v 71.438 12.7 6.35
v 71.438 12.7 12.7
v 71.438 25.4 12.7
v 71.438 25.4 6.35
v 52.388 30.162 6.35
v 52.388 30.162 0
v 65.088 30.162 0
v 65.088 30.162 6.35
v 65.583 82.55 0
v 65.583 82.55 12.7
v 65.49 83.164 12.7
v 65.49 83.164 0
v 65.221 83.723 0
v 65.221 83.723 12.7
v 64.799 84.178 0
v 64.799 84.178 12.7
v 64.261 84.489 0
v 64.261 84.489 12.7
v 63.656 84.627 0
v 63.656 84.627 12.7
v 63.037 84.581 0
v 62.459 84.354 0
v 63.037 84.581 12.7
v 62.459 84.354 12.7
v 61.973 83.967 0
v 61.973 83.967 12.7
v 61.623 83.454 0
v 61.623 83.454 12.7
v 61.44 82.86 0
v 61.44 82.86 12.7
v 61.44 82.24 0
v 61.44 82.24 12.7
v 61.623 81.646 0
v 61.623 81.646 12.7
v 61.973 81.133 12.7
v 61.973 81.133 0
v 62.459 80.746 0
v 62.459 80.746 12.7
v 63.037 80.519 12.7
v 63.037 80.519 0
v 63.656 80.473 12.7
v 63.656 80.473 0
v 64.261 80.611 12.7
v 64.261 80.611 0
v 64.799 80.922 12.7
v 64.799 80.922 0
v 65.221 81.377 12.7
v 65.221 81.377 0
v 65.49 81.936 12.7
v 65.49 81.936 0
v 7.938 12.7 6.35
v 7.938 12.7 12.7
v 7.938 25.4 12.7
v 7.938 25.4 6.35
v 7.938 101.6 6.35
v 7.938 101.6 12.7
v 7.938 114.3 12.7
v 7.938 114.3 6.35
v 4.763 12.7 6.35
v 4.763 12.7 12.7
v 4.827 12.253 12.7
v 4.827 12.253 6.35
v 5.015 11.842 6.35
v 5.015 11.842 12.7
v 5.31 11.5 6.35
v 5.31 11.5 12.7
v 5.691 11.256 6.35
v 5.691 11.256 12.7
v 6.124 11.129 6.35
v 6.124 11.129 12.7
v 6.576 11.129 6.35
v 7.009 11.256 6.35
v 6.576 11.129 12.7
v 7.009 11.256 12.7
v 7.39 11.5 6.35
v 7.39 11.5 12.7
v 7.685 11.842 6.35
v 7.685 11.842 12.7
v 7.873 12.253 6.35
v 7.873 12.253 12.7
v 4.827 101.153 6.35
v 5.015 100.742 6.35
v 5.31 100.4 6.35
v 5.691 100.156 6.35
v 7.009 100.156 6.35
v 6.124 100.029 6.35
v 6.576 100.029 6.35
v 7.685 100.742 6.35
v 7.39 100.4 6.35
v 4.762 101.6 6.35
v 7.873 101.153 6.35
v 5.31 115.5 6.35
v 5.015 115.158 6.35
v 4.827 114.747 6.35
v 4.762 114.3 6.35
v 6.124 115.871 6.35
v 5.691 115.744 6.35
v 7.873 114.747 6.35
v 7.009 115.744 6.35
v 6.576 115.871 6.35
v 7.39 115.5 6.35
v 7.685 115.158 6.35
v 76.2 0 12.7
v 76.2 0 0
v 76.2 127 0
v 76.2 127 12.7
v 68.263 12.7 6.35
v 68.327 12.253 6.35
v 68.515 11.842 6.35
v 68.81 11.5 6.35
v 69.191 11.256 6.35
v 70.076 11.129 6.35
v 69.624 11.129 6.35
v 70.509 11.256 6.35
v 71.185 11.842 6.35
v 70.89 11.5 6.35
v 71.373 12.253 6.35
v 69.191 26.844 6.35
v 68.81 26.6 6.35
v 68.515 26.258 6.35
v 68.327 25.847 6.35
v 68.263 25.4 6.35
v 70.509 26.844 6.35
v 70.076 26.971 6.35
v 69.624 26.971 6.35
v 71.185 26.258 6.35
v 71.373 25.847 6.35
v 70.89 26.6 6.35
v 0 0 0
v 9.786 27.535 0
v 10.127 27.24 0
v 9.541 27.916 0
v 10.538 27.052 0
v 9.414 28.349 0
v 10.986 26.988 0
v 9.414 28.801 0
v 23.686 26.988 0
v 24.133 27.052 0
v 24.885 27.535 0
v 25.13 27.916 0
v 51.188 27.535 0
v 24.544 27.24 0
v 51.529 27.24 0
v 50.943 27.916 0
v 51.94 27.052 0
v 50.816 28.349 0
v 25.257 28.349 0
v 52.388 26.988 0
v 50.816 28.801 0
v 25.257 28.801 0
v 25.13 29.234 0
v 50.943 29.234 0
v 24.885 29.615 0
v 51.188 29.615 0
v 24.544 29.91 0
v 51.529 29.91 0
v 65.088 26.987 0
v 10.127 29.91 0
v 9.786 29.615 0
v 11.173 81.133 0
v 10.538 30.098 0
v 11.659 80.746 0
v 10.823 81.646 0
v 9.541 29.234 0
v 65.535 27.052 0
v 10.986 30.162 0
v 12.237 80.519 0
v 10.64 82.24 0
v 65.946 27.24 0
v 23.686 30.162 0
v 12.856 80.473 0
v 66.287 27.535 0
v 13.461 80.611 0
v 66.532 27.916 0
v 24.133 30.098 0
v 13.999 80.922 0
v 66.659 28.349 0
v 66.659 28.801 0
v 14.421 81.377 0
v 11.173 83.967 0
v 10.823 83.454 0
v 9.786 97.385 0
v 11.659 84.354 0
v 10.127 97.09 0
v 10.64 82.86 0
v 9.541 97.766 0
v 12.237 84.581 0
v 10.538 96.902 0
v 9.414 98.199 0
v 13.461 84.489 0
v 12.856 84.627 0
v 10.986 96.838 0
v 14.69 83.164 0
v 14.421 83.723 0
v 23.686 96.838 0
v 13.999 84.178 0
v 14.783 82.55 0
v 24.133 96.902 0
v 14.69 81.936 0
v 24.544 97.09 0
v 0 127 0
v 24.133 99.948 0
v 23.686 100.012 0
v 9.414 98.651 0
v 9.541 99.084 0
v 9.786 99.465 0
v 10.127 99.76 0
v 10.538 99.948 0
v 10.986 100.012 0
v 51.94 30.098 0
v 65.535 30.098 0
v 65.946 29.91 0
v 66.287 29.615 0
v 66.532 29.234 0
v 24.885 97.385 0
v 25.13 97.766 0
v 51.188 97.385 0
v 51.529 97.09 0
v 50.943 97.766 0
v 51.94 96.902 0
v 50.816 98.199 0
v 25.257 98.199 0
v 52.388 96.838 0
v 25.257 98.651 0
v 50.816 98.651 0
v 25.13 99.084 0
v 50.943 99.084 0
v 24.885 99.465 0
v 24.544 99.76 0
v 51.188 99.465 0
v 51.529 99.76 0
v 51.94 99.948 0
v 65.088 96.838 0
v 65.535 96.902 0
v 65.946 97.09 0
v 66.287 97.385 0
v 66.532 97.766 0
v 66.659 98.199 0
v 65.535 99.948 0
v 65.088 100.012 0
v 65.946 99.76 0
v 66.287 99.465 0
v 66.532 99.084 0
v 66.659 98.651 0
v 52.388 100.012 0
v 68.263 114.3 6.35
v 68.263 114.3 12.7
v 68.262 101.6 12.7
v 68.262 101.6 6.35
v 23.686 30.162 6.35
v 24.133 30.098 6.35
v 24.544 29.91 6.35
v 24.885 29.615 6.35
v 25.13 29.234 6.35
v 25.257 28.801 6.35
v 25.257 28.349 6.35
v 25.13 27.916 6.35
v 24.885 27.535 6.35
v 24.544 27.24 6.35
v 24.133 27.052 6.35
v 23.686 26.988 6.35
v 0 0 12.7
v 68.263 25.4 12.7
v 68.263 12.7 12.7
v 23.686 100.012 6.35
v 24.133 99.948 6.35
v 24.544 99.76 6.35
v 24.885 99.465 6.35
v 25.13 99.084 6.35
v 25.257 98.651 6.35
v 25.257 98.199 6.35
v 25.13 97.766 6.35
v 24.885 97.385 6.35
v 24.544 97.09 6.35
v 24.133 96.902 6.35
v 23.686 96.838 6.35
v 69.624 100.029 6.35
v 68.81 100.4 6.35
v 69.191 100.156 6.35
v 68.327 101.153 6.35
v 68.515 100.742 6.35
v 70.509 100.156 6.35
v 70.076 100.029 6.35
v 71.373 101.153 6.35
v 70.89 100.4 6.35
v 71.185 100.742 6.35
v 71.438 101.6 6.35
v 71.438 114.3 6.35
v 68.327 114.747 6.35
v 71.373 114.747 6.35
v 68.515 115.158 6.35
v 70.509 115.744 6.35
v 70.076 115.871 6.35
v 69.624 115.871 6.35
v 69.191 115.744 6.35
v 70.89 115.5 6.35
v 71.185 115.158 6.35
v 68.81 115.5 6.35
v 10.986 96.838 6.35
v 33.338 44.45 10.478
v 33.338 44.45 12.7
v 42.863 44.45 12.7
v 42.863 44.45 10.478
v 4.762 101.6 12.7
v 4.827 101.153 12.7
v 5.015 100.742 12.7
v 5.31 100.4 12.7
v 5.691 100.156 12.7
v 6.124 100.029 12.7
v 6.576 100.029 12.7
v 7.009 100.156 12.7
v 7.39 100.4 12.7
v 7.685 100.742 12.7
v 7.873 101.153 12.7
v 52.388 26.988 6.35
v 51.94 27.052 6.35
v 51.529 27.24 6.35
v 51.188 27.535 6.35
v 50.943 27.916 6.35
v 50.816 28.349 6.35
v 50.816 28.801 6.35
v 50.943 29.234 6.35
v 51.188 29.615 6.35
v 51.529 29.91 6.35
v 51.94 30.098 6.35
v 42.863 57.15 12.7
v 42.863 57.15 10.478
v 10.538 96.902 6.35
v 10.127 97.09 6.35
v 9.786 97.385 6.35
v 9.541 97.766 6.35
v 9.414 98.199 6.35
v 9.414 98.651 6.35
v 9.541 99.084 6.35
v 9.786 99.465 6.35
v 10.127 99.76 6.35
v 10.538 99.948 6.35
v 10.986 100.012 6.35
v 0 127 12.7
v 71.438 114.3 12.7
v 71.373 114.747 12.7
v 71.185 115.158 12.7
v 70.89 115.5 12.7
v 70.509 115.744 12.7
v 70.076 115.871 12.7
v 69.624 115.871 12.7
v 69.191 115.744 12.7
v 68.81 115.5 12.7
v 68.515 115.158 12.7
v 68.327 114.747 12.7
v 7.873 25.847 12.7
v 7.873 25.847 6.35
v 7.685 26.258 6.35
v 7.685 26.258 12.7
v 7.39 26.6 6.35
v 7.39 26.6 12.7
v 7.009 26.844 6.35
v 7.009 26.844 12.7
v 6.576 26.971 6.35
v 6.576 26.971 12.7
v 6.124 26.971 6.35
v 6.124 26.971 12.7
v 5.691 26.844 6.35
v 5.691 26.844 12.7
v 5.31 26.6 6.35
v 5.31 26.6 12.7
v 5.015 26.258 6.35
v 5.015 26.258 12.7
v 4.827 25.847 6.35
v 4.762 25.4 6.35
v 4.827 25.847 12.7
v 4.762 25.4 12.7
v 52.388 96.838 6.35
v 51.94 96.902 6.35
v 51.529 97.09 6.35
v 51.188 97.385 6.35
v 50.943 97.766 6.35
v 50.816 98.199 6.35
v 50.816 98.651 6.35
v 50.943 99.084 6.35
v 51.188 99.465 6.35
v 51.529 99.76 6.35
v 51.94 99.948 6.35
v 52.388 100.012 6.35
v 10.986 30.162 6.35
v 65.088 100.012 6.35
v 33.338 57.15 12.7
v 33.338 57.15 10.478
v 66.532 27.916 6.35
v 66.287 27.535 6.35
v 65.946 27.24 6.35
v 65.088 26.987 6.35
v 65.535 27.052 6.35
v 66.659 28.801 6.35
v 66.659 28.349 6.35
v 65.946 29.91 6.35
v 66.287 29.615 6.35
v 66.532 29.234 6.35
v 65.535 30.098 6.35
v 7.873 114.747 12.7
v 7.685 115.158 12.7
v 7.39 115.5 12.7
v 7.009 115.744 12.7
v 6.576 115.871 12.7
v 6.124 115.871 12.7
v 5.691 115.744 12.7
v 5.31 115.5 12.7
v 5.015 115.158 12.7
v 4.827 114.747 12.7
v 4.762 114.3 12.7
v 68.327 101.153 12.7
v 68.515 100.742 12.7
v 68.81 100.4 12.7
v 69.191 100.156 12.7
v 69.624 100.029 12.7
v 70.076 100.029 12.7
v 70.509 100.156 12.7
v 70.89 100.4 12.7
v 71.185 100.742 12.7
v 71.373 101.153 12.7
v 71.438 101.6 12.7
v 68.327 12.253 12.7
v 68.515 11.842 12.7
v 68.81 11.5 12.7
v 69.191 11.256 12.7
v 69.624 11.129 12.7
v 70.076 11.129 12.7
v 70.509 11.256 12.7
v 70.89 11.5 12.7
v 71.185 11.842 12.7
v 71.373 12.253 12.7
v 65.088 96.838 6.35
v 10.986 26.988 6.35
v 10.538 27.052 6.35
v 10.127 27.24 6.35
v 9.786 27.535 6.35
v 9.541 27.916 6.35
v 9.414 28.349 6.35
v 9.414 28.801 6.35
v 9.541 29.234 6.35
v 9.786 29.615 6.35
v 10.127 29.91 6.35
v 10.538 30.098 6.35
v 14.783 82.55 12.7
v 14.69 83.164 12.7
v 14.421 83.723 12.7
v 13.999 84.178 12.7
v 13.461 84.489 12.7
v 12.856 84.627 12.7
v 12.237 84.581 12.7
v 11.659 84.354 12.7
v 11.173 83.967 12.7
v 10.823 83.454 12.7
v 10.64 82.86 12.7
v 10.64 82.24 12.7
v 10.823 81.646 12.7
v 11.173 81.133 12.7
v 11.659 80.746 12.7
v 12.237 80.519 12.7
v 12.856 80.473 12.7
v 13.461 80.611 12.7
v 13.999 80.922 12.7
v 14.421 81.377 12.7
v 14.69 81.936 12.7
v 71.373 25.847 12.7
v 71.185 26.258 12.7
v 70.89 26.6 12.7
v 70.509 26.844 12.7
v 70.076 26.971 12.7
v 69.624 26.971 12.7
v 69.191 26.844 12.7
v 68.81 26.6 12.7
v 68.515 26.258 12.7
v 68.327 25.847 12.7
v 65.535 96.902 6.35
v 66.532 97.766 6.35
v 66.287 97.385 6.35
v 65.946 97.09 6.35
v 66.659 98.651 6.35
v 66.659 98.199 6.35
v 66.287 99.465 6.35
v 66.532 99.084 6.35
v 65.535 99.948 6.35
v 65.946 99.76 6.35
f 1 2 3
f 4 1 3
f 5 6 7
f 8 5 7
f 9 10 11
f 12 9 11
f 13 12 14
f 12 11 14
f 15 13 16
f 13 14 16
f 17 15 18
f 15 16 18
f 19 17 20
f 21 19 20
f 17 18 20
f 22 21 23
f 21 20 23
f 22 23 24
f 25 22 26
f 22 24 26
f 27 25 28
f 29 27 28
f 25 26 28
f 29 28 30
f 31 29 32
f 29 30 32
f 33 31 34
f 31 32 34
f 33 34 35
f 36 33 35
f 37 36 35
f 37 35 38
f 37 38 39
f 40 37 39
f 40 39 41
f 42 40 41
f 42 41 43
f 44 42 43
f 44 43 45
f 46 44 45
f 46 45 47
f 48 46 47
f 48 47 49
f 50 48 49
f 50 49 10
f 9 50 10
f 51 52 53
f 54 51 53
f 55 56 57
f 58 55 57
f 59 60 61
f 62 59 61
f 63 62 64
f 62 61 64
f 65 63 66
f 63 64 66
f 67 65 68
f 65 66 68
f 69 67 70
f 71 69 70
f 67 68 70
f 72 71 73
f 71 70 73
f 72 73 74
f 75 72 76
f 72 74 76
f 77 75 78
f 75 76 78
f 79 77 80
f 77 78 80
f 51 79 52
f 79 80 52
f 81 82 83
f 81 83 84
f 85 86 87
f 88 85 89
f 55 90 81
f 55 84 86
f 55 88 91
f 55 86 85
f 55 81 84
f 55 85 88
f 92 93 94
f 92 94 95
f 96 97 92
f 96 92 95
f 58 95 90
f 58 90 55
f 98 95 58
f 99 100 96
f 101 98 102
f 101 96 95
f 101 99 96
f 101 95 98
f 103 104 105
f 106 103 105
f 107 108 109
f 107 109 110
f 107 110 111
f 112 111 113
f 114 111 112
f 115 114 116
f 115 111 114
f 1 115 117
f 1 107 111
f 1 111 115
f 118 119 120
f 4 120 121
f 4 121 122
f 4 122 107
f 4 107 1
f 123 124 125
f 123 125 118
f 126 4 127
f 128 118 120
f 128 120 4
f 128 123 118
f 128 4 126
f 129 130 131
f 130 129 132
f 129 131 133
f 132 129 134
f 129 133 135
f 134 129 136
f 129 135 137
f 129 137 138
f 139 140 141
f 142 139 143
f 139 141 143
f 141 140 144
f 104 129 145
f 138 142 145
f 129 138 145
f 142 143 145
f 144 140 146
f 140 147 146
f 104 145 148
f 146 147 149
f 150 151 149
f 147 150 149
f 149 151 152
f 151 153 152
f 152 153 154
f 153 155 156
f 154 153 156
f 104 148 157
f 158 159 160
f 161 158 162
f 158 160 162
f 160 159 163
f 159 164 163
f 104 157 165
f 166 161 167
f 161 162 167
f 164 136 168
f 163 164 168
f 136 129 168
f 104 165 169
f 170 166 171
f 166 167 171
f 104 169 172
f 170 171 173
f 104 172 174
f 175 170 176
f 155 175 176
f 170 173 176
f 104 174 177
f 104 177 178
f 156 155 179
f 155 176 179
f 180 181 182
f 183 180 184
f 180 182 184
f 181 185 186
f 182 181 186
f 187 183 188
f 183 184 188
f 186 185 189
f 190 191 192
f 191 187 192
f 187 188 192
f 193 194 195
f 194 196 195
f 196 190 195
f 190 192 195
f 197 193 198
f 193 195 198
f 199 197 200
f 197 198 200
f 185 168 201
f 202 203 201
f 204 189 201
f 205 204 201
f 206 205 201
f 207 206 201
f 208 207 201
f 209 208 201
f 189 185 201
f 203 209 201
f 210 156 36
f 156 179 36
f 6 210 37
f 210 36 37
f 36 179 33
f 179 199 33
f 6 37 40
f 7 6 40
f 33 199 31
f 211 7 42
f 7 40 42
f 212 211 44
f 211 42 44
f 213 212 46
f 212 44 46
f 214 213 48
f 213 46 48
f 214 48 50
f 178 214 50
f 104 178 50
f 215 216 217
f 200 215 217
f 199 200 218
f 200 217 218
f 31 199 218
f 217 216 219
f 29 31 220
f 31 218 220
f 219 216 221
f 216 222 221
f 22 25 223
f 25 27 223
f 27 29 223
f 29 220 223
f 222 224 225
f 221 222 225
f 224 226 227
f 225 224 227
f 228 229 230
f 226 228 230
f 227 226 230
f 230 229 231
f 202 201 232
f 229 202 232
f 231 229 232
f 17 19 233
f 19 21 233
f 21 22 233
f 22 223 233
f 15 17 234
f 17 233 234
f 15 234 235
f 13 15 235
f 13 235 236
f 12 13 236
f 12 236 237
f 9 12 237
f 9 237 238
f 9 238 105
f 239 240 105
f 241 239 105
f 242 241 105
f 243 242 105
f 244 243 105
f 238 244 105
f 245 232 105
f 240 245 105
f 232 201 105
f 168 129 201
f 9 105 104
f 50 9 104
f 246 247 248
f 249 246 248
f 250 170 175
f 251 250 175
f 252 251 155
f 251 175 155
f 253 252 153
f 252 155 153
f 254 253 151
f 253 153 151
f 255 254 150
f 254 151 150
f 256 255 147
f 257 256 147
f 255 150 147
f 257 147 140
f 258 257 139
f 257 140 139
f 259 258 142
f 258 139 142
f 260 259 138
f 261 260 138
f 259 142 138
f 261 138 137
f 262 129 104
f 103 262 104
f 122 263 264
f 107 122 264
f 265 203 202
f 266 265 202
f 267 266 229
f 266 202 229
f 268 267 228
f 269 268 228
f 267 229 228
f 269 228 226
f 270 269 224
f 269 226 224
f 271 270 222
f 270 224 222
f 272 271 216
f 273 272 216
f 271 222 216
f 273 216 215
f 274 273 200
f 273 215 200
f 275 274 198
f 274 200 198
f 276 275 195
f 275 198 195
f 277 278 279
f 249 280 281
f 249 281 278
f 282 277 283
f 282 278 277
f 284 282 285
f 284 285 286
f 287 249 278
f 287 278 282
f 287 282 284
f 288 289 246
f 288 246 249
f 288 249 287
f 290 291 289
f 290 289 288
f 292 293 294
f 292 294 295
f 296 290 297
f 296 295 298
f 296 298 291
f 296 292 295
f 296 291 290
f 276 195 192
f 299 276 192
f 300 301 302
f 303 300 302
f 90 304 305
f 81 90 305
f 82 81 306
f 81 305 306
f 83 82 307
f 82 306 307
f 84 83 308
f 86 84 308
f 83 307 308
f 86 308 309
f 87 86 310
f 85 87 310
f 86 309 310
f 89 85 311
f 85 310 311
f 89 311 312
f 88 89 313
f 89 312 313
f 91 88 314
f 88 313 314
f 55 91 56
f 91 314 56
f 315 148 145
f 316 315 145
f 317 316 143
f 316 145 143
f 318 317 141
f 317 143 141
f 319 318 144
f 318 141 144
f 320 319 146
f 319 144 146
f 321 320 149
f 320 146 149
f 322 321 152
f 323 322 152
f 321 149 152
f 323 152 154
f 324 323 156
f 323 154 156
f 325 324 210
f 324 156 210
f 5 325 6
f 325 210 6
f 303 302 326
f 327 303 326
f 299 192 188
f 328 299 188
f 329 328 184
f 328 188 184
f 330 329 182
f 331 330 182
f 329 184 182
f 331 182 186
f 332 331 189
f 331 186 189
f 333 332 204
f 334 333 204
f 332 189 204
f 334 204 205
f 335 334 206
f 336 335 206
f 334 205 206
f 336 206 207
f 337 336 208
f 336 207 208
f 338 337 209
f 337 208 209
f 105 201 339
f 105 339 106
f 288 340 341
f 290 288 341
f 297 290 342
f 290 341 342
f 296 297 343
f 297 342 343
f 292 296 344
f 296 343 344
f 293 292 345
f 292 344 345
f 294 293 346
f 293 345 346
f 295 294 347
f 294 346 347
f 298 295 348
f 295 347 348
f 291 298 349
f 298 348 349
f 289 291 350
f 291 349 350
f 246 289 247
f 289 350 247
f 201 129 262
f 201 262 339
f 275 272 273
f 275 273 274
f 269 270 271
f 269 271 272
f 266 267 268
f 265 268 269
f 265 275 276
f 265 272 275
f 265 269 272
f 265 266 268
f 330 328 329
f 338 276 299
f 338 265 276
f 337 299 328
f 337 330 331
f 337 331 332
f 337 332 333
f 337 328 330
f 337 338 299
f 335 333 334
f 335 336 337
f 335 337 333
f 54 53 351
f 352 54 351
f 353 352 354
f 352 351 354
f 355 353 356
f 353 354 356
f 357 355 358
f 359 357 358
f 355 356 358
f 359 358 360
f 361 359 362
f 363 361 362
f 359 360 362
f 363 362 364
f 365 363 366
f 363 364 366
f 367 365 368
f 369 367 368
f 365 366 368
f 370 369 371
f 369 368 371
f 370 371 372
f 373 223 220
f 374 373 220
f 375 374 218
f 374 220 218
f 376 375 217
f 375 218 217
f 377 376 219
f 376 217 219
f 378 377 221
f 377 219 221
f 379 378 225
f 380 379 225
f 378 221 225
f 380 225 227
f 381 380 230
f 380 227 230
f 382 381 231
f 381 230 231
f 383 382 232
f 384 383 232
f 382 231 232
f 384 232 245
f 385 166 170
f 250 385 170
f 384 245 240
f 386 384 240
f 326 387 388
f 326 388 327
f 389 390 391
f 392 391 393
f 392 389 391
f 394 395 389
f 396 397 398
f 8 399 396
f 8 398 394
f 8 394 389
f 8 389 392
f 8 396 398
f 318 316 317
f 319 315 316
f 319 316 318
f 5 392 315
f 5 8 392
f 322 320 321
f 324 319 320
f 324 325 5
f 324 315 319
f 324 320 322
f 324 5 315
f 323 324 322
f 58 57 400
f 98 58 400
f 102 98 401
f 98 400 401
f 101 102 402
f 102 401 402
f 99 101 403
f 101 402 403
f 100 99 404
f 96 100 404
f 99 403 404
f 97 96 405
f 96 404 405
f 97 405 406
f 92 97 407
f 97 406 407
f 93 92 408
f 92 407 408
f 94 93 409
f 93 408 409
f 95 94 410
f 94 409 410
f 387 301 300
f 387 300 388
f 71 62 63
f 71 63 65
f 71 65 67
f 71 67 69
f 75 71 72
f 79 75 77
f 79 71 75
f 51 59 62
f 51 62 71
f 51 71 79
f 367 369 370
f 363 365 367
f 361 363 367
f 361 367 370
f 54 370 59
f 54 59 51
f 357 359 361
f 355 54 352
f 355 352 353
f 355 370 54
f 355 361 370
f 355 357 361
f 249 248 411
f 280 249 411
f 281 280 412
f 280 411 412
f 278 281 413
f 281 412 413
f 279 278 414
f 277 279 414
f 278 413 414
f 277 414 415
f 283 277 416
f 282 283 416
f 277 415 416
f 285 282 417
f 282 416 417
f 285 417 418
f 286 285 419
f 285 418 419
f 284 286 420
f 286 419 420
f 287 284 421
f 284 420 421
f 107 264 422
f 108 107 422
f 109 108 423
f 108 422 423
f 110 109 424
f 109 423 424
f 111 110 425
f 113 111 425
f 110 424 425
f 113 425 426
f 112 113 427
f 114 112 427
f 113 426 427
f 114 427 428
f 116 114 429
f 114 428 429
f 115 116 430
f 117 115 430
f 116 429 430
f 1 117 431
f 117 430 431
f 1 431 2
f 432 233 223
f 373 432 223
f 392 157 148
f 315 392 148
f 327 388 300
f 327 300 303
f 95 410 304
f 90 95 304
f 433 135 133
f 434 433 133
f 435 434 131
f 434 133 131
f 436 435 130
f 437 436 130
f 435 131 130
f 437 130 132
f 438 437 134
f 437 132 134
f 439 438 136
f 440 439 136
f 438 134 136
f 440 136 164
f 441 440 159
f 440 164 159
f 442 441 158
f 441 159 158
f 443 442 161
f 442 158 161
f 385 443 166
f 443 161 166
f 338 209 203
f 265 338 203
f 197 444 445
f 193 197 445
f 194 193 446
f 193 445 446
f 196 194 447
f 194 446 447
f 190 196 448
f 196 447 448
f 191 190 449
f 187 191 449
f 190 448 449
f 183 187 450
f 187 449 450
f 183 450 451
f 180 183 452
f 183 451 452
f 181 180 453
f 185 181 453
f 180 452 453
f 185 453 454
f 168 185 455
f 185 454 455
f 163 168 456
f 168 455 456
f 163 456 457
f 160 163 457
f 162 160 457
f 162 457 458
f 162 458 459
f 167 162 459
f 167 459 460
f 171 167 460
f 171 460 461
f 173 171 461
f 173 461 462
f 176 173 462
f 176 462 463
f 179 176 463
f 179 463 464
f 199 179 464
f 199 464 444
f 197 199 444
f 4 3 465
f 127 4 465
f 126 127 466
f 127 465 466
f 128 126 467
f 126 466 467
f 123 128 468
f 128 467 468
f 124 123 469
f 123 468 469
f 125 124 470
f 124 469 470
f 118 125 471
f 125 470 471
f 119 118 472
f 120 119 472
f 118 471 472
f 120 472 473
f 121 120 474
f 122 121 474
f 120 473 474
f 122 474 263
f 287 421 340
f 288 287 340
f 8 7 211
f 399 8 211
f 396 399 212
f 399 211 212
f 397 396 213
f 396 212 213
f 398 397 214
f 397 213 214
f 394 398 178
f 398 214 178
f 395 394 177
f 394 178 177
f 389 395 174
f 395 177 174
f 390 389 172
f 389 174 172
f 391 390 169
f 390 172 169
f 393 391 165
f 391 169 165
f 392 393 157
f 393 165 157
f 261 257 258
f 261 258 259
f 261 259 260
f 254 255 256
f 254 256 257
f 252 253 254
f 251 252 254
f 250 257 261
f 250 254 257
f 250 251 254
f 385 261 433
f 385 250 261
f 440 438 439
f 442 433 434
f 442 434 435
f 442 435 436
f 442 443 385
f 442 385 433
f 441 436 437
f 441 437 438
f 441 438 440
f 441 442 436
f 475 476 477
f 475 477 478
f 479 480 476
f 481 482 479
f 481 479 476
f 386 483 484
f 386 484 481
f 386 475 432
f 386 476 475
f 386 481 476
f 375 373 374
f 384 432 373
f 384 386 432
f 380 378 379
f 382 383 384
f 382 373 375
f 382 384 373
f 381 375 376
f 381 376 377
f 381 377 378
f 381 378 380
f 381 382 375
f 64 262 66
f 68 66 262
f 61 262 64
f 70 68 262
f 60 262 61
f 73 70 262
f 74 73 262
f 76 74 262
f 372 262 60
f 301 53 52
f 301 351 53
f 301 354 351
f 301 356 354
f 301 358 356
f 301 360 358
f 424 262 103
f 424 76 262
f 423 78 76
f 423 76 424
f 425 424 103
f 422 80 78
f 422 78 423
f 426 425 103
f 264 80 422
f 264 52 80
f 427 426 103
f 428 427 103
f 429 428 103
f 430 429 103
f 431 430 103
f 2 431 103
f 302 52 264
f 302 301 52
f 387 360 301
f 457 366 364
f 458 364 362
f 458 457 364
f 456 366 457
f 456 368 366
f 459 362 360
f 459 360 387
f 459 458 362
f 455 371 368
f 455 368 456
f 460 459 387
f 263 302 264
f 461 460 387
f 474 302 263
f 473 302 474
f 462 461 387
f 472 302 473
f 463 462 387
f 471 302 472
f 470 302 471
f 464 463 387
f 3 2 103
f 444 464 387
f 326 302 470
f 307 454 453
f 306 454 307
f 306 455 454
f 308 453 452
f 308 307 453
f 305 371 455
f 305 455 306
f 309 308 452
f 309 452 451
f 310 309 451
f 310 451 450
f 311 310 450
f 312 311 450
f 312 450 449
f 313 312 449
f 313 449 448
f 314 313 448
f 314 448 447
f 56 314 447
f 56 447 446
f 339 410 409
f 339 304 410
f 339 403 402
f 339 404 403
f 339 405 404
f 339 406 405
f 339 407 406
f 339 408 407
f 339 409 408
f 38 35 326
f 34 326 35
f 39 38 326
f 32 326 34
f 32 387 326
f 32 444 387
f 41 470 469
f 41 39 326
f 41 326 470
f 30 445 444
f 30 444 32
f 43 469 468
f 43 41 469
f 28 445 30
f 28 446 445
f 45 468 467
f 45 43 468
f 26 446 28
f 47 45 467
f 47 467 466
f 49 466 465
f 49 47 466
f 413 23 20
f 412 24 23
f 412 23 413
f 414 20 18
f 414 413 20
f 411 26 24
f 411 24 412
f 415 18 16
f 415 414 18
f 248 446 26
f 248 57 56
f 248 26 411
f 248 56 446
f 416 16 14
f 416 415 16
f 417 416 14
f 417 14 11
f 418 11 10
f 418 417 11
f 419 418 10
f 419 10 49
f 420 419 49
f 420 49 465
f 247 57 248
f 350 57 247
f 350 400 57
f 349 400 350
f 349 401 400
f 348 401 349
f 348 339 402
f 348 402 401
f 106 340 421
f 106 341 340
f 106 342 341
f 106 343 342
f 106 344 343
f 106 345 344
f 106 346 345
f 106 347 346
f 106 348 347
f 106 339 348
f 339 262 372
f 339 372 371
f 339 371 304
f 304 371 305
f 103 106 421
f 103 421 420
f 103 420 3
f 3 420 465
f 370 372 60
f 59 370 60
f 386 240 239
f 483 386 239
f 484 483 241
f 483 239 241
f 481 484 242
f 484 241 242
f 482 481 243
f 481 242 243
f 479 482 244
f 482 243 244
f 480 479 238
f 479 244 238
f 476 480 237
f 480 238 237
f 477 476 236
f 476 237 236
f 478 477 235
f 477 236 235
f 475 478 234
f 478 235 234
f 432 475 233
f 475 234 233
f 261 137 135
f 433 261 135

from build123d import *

# Parameters (mm, degrees)
SKETCH1_W           = 76.2
SKETCH1_H           = 127
BOSS_EXTRUDE1_DEPTH = 12.7
CUT_EXTRUDE1_DEPTH  = 6.35
CUT_EXTRUDE2_DEPTH  = 6.35
SKETCH4_W           = 9.525
SKETCH4_H           = 12.7
CUT_EXTRUDE3_DEPTH  = 2.2225
SKETCH5_R           = 2.0828
CUT_EXTRUDE4_DEPTH  = 25.4


with BuildPart() as part:
    # Sketch1 → Boss-Extrude1 (new body)
    with BuildSketch(Plane.XY):
        with Locations((38.1, 63.5)):
            Rectangle(SKETCH1_W, SKETCH1_H)
    extrude(amount=BOSS_EXTRUDE1_DEPTH)

    # Sketch2 → Cut-Extrude1 (cut)
    with BuildSketch(Plane.XY.offset(12.7)):
        with BuildLine():
            Line((71.4375, 12.7), (71.4375, 25.4))
            ThreePointArc((71.4375, 25.4), (69.85, 26.9875), (68.2625, 25.4))
            Line((68.2625, 25.4), (68.2625, 12.7))
            ThreePointArc((68.2625, 12.7), (69.85, 11.1125), (71.4375, 12.7))
        make_face()
        with BuildLine():
            Line((7.9375, 12.7), (7.9375, 25.4))
            ThreePointArc((7.9375, 25.4), (6.35, 26.9875), (4.7625, 25.4))
            Line((4.7625, 25.4), (4.7625, 12.7))
            ThreePointArc((4.7625, 12.7), (6.35, 11.1125), (7.9375, 12.7))
        make_face()
        with BuildLine():
            Line((7.9375, 101.6), (7.9375, 114.3))
            ThreePointArc((7.9375, 114.3), (6.35, 115.8875), (4.7625, 114.3))
            Line((4.7625, 114.3), (4.7625, 101.6))
            ThreePointArc((4.7625, 101.6), (6.35, 100.0125), (7.9375, 101.6))
        make_face()
        with BuildLine():
            Line((71.4375, 101.6), (71.4375, 114.3))
            ThreePointArc((71.4375, 114.3), (69.85, 115.8875), (68.2625, 114.3))
            Line((68.2625, 114.3), (68.2625, 101.6))
            ThreePointArc((68.2625, 101.6), (69.85, 100.0125), (71.4375, 101.6))
        make_face()
    extrude(amount=-CUT_EXTRUDE1_DEPTH, mode=Mode.SUBTRACT)

    # Sketch3 → Cut-Extrude2 (cut)
    with BuildSketch(Plane(origin=(0, 0, 0), x_dir=(-1, 0, 0), z_dir=(0, 0, -1))):
        with BuildLine():
            Line((-23.6855, 96.8375), (-10.9855, 96.8375))
            ThreePointArc((-10.9855, 96.8375), (-9.398, 98.425), (-10.9855, 100.0125))
            Line((-10.9855, 100.0125), (-23.6855, 100.0125))
            ThreePointArc((-23.6855, 100.0125), (-25.273, 98.425), (-23.6855, 96.8375))
        make_face()
        with BuildLine():
            Line((-65.0875, 96.8375), (-52.3875, 96.8375))
            ThreePointArc((-52.3875, 96.8375), (-50.8, 98.425), (-52.3875, 100.0125))
            Line((-52.3875, 100.0125), (-65.0875, 100.0125))
            ThreePointArc((-65.0875, 100.0125), (-66.675, 98.425), (-65.0875, 96.8375))
        make_face()
        with BuildLine():
            Line((-65.0875, 26.9875), (-52.3875, 26.9875))
            ThreePointArc((-52.3875, 26.9875), (-50.8, 28.575), (-52.3875, 30.1625))
            Line((-52.3875, 30.1625), (-65.0875, 30.1625))
            ThreePointArc((-65.0875, 30.1625), (-66.675, 28.575), (-65.0875, 26.9875))
        make_face()
        with BuildLine():
            Line((-23.6855, 26.9875), (-10.9855, 26.9875))
            ThreePointArc((-10.9855, 26.9875), (-9.398, 28.575), (-10.9855, 30.1625))
            Line((-10.9855, 30.1625), (-23.6855, 30.1625))
            ThreePointArc((-23.6855, 30.1625), (-25.273, 28.575), (-23.6855, 26.9875))
        make_face()
    extrude(amount=-CUT_EXTRUDE2_DEPTH, mode=Mode.SUBTRACT)

    # Sketch4 → Cut-Extrude3 (cut)
    with BuildSketch(Plane.XY.offset(12.7)):
        with Locations((38.1, 50.8)):
            Rectangle(SKETCH4_W, SKETCH4_H)
    extrude(amount=-CUT_EXTRUDE3_DEPTH, mode=Mode.SUBTRACT)

    # Sketch5 → Cut-Extrude4 (cut)
    with BuildSketch(Plane.XY.offset(12.7)):
        with Locations((12.7, 82.55)):
            Circle(SKETCH5_R)
        with Locations((63.5, 82.55)):
            Circle(SKETCH5_R)
    extrude(amount=-CUT_EXTRUDE4_DEPTH, mode=Mode.SUBTRACT)


solid = part.part
